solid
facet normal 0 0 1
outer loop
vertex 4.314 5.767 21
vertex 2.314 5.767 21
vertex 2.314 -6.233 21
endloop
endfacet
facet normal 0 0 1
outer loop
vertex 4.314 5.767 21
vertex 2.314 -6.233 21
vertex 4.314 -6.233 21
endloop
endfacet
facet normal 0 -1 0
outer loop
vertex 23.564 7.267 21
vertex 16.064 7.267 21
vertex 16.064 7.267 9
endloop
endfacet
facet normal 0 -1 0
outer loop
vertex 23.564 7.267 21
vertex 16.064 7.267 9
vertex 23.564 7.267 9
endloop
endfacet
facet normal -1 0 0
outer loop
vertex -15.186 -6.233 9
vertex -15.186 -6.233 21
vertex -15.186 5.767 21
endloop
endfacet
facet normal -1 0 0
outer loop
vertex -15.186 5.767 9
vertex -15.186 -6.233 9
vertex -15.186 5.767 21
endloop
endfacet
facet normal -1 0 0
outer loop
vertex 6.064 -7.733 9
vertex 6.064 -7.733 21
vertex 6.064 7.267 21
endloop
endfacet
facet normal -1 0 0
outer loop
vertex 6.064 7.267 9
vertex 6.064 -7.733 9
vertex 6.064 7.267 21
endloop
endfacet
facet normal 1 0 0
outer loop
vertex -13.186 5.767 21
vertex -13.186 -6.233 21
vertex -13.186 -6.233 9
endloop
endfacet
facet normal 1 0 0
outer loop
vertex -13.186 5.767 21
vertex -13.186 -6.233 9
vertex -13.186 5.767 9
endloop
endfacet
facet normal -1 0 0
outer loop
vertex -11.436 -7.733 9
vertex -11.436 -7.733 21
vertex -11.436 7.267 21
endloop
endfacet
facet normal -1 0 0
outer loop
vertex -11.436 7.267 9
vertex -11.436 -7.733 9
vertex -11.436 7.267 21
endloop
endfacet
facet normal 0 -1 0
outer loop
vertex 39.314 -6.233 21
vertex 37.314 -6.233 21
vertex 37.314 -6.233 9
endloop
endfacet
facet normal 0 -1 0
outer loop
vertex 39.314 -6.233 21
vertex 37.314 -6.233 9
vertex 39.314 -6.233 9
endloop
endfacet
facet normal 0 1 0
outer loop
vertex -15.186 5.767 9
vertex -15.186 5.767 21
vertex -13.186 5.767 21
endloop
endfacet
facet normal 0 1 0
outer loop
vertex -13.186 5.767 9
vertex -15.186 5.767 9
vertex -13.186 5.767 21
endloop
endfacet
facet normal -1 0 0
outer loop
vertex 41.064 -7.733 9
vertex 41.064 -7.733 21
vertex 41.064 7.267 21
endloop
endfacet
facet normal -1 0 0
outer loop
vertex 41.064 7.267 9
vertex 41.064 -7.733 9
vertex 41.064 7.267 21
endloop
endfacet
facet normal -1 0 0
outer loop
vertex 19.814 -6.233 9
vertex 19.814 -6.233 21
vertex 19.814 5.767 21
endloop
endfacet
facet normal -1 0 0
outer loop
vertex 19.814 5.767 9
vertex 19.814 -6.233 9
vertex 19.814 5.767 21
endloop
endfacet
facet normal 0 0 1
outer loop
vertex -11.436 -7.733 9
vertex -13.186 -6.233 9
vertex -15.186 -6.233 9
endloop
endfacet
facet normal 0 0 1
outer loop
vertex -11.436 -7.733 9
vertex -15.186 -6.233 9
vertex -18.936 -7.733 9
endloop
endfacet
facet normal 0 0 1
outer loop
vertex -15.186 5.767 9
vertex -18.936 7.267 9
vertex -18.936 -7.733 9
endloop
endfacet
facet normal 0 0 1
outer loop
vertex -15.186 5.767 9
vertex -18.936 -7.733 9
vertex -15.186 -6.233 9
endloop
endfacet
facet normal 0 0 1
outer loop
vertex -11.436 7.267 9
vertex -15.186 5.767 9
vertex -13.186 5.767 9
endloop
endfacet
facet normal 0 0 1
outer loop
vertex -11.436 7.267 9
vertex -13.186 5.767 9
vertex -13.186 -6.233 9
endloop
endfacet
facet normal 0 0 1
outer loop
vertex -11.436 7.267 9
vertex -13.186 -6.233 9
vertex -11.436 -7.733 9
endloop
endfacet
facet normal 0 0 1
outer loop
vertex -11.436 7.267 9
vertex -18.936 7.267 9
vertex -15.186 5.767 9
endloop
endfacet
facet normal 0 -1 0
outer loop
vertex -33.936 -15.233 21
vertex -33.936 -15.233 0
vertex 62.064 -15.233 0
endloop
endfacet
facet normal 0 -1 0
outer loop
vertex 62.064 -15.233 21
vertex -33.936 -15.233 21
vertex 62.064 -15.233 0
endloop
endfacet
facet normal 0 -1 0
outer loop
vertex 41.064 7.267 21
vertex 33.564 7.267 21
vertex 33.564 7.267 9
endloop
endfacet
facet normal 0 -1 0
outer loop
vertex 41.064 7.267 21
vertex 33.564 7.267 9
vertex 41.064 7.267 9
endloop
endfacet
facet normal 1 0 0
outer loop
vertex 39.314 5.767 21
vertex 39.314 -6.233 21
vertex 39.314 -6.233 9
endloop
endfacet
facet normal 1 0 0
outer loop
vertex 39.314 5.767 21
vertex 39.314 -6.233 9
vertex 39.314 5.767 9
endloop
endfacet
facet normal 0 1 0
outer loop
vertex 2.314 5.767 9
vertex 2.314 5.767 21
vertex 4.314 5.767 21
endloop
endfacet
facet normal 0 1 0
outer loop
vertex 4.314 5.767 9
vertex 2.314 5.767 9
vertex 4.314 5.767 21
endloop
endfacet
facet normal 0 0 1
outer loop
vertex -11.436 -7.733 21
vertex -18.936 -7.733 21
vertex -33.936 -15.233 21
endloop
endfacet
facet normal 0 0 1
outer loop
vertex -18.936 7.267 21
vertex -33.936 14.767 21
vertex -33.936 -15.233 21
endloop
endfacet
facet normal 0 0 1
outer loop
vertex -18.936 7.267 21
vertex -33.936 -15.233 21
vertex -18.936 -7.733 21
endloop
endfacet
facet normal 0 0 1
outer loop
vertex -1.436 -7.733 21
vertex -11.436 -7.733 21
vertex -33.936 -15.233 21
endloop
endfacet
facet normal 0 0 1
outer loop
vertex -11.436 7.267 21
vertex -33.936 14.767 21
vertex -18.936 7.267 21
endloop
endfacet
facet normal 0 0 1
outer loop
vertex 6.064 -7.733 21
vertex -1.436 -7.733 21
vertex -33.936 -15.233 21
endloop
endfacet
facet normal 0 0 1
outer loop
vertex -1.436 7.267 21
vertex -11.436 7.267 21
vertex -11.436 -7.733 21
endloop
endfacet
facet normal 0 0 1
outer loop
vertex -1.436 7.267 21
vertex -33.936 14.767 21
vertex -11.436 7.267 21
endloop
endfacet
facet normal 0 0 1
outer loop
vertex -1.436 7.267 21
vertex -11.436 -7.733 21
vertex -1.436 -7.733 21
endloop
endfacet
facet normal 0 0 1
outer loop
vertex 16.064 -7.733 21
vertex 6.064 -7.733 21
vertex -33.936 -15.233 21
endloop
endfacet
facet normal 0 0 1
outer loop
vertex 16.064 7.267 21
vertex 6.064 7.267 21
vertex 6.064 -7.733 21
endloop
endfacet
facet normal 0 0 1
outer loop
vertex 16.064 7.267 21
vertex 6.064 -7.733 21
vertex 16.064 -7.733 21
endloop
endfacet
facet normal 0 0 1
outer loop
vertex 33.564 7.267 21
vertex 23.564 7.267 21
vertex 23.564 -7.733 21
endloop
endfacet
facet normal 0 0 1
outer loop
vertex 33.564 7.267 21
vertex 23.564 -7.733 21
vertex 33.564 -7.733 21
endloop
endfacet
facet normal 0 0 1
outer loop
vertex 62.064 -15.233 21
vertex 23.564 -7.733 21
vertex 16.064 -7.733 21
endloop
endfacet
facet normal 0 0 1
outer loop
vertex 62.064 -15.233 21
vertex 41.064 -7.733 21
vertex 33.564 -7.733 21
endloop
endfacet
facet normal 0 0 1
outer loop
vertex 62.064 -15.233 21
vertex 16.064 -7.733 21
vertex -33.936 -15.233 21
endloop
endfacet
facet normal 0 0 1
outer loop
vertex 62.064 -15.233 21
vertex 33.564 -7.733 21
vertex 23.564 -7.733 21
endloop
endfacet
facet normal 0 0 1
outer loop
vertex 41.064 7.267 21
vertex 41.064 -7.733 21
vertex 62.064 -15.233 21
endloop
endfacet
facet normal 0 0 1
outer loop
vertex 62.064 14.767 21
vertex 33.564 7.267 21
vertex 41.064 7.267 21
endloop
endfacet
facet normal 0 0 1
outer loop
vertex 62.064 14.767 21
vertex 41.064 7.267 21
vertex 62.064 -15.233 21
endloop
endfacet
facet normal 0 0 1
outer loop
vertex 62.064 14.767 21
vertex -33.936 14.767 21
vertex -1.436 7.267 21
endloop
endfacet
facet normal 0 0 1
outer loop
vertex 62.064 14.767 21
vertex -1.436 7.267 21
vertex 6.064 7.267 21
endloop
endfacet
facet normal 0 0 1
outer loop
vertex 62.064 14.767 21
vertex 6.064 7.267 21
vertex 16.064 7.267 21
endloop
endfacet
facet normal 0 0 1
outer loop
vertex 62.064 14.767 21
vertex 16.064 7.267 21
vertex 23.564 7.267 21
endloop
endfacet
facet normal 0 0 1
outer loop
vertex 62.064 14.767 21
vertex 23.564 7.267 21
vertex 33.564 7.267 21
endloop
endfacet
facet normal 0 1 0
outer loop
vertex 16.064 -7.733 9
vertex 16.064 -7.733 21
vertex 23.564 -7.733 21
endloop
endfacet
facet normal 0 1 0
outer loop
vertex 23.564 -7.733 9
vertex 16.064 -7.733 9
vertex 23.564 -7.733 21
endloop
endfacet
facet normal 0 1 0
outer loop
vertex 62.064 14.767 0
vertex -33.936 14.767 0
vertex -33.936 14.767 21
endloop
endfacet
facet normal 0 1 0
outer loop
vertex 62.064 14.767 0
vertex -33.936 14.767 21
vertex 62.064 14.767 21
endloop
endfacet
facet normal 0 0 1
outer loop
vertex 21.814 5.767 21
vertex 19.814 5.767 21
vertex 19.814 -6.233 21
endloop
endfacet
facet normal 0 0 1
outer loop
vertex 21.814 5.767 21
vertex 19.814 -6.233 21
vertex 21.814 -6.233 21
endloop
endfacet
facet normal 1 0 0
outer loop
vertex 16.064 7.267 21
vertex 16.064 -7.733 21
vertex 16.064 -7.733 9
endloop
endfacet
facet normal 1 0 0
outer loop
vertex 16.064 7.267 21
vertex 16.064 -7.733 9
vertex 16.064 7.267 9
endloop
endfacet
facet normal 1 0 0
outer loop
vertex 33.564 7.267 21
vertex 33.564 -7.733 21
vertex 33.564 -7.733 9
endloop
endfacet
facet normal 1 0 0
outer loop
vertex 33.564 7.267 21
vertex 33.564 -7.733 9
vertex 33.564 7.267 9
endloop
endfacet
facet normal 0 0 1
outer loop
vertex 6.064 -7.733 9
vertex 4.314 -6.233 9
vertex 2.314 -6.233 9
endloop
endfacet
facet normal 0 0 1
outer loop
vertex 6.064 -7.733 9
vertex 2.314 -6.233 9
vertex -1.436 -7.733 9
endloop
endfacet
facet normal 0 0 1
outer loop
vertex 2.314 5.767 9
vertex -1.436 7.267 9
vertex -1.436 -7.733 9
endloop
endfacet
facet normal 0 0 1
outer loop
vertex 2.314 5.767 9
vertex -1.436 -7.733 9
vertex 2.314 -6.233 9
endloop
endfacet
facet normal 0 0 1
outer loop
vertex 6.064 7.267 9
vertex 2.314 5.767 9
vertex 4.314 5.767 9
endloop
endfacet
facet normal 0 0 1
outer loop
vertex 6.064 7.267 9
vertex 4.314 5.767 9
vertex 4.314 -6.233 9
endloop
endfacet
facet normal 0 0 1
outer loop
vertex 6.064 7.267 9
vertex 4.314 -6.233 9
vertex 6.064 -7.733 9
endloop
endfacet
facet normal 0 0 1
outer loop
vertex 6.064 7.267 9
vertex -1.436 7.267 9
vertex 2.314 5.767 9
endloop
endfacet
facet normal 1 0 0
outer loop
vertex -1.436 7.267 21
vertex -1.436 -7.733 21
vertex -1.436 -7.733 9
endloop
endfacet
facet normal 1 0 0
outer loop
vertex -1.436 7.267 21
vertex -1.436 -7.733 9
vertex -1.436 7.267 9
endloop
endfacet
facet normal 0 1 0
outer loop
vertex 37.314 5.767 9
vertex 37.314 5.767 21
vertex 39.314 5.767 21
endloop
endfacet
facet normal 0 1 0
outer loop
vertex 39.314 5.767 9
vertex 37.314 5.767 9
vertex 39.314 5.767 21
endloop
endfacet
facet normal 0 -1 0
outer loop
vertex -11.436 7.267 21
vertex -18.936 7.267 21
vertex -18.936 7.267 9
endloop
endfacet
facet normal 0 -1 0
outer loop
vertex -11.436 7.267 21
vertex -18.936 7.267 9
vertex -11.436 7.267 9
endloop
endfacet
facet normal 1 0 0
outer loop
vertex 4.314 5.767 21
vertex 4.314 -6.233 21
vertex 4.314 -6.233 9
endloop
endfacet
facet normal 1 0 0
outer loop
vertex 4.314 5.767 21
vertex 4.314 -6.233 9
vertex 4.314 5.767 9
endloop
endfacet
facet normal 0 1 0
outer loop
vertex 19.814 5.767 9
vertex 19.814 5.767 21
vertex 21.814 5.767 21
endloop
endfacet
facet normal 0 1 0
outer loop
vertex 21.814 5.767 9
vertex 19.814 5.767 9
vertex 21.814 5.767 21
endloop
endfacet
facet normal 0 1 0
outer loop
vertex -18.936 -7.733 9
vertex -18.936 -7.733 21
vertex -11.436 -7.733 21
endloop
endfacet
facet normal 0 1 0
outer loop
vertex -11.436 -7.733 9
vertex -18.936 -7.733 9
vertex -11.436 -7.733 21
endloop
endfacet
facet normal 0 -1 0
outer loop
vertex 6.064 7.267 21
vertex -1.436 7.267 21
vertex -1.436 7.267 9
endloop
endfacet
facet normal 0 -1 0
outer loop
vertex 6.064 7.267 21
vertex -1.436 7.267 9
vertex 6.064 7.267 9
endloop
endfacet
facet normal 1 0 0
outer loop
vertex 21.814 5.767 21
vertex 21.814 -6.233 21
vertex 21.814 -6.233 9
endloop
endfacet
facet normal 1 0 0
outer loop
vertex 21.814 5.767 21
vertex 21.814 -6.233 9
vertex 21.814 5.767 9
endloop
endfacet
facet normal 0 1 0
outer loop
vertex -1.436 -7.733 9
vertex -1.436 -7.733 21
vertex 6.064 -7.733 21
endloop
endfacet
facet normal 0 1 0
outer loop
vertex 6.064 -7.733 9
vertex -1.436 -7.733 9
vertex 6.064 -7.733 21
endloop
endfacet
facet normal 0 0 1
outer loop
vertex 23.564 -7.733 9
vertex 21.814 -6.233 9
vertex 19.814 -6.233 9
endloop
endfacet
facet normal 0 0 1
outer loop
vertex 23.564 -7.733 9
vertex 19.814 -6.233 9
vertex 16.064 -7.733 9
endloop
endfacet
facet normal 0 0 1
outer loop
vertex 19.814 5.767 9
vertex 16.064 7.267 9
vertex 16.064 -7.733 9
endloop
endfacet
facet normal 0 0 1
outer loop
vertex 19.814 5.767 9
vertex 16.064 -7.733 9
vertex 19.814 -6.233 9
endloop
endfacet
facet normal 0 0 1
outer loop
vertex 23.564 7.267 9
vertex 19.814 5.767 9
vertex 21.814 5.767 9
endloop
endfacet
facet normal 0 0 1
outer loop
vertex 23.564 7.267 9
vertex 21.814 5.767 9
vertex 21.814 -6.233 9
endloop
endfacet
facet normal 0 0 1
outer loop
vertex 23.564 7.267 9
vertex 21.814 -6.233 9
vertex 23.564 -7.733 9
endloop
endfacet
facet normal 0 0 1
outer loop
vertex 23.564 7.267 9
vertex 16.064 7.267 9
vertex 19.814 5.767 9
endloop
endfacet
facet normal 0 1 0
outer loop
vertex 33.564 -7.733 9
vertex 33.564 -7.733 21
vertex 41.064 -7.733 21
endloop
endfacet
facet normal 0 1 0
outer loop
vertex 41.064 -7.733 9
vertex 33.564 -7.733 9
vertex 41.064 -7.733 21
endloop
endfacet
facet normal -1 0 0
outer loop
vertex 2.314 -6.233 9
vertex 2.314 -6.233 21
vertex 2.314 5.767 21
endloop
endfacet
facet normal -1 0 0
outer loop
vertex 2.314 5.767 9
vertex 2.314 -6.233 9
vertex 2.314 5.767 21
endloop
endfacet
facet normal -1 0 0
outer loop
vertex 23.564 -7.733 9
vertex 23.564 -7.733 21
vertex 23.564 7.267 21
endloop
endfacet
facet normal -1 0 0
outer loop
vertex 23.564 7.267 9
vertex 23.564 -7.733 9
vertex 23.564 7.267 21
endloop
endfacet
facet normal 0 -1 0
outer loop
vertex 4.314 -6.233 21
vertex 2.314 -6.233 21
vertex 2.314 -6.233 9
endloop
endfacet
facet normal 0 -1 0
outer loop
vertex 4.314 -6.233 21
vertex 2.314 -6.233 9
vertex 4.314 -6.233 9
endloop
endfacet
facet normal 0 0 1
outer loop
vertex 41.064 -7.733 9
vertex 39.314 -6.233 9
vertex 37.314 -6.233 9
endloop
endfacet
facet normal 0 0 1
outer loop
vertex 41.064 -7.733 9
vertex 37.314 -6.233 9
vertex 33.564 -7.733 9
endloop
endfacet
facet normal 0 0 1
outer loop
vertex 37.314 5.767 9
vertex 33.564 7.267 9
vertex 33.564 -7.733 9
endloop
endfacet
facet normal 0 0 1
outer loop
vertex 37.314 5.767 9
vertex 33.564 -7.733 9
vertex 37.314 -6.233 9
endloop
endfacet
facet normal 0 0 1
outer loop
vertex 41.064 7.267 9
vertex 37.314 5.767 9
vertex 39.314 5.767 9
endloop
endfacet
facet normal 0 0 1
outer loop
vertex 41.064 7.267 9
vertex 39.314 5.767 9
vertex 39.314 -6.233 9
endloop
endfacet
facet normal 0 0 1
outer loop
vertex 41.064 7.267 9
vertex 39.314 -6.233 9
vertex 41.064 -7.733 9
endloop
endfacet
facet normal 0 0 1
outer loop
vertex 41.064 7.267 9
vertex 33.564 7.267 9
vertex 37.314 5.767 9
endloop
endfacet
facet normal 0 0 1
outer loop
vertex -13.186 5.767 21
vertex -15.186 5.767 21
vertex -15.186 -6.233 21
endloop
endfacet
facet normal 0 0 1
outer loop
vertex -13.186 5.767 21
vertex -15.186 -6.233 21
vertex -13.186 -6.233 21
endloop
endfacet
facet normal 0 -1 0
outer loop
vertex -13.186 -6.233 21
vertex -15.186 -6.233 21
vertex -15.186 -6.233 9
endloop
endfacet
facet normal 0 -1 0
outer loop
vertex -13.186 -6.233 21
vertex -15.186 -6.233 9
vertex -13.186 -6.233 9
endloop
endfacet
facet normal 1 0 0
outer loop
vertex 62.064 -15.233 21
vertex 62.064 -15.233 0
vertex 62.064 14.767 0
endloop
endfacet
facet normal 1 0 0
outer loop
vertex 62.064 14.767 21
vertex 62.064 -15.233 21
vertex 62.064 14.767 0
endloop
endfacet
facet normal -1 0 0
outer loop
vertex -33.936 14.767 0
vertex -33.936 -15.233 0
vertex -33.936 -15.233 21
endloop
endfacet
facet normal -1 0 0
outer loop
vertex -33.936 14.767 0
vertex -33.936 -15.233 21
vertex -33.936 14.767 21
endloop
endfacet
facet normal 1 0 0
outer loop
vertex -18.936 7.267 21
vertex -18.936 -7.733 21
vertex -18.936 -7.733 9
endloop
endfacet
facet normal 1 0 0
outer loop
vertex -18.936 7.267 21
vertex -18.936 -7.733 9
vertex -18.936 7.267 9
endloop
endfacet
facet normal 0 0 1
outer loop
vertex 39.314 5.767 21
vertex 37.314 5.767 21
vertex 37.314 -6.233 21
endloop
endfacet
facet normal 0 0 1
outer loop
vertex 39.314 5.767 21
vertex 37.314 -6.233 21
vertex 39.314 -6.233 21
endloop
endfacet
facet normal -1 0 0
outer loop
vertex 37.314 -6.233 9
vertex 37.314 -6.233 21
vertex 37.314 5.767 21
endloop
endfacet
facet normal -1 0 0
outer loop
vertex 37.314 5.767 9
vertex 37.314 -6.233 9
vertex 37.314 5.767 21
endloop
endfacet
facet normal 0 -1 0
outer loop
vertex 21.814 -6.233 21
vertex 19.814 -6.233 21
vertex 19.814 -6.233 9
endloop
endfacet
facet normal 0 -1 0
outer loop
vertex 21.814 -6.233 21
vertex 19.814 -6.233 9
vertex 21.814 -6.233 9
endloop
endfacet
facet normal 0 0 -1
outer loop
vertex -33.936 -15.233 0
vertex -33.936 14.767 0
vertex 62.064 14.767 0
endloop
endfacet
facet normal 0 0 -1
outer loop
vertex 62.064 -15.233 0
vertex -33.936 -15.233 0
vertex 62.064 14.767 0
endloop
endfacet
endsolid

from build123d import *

# Parameters (mm, degrees)
ESQUISSE1_W                = 96
ESQUISSE1_H                = 30
BOSS_EXTRU_1_DEPTH         = 21
ESQUISSE2_W                = 7.5
ESQUISSE2_H                = 15
ESQUISSE2_W_2              = 2
ESQUISSE2_H_2              = 12
ENL_V_MAT_EXTRU_1_DEPTH    = 12
R_P_TITION_LIN_AIRE1_COUNT = 4
R_P_TITION_LIN_AIRE1_PITCH = 17.5


with BuildPart() as part:
    # Esquisse1 → Boss.-Extru.1 (new body)
    with BuildSketch(Plane.XY):
        with Locations((14.064055763, -0.233160622)):
            Rectangle(ESQUISSE1_W, ESQUISSE1_H)
    extrude(amount=BOSS_EXTRU_1_DEPTH)

    # Esquisse2 → Enlèv. mat.-Extru.1 (cut)
    with BuildSketch(Plane.XY.offset(21)):
        with Locations((-15.185944237, -0.233160622)):
            Rectangle(ESQUISSE2_W, ESQUISSE2_H)
        with Locations((-14.185944237, -0.233160622)):
            Rectangle(ESQUISSE2_W_2, ESQUISSE2_H_2, mode=Mode.SUBTRACT)
    enl_v_mat_extru_1 = extrude(amount=-ENL_V_MAT_EXTRU_1_DEPTH, mode=Mode.SUBTRACT)

    # Répétition linéaire1: Enlèv. mat.-Extru.1 ×4
    with Locations(*[(i * R_P_TITION_LIN_AIRE1_PITCH, 0, 0) for i in range(1, R_P_TITION_LIN_AIRE1_COUNT)]):
        add(enl_v_mat_extru_1, mode=Mode.SUBTRACT)


solid = part.part
